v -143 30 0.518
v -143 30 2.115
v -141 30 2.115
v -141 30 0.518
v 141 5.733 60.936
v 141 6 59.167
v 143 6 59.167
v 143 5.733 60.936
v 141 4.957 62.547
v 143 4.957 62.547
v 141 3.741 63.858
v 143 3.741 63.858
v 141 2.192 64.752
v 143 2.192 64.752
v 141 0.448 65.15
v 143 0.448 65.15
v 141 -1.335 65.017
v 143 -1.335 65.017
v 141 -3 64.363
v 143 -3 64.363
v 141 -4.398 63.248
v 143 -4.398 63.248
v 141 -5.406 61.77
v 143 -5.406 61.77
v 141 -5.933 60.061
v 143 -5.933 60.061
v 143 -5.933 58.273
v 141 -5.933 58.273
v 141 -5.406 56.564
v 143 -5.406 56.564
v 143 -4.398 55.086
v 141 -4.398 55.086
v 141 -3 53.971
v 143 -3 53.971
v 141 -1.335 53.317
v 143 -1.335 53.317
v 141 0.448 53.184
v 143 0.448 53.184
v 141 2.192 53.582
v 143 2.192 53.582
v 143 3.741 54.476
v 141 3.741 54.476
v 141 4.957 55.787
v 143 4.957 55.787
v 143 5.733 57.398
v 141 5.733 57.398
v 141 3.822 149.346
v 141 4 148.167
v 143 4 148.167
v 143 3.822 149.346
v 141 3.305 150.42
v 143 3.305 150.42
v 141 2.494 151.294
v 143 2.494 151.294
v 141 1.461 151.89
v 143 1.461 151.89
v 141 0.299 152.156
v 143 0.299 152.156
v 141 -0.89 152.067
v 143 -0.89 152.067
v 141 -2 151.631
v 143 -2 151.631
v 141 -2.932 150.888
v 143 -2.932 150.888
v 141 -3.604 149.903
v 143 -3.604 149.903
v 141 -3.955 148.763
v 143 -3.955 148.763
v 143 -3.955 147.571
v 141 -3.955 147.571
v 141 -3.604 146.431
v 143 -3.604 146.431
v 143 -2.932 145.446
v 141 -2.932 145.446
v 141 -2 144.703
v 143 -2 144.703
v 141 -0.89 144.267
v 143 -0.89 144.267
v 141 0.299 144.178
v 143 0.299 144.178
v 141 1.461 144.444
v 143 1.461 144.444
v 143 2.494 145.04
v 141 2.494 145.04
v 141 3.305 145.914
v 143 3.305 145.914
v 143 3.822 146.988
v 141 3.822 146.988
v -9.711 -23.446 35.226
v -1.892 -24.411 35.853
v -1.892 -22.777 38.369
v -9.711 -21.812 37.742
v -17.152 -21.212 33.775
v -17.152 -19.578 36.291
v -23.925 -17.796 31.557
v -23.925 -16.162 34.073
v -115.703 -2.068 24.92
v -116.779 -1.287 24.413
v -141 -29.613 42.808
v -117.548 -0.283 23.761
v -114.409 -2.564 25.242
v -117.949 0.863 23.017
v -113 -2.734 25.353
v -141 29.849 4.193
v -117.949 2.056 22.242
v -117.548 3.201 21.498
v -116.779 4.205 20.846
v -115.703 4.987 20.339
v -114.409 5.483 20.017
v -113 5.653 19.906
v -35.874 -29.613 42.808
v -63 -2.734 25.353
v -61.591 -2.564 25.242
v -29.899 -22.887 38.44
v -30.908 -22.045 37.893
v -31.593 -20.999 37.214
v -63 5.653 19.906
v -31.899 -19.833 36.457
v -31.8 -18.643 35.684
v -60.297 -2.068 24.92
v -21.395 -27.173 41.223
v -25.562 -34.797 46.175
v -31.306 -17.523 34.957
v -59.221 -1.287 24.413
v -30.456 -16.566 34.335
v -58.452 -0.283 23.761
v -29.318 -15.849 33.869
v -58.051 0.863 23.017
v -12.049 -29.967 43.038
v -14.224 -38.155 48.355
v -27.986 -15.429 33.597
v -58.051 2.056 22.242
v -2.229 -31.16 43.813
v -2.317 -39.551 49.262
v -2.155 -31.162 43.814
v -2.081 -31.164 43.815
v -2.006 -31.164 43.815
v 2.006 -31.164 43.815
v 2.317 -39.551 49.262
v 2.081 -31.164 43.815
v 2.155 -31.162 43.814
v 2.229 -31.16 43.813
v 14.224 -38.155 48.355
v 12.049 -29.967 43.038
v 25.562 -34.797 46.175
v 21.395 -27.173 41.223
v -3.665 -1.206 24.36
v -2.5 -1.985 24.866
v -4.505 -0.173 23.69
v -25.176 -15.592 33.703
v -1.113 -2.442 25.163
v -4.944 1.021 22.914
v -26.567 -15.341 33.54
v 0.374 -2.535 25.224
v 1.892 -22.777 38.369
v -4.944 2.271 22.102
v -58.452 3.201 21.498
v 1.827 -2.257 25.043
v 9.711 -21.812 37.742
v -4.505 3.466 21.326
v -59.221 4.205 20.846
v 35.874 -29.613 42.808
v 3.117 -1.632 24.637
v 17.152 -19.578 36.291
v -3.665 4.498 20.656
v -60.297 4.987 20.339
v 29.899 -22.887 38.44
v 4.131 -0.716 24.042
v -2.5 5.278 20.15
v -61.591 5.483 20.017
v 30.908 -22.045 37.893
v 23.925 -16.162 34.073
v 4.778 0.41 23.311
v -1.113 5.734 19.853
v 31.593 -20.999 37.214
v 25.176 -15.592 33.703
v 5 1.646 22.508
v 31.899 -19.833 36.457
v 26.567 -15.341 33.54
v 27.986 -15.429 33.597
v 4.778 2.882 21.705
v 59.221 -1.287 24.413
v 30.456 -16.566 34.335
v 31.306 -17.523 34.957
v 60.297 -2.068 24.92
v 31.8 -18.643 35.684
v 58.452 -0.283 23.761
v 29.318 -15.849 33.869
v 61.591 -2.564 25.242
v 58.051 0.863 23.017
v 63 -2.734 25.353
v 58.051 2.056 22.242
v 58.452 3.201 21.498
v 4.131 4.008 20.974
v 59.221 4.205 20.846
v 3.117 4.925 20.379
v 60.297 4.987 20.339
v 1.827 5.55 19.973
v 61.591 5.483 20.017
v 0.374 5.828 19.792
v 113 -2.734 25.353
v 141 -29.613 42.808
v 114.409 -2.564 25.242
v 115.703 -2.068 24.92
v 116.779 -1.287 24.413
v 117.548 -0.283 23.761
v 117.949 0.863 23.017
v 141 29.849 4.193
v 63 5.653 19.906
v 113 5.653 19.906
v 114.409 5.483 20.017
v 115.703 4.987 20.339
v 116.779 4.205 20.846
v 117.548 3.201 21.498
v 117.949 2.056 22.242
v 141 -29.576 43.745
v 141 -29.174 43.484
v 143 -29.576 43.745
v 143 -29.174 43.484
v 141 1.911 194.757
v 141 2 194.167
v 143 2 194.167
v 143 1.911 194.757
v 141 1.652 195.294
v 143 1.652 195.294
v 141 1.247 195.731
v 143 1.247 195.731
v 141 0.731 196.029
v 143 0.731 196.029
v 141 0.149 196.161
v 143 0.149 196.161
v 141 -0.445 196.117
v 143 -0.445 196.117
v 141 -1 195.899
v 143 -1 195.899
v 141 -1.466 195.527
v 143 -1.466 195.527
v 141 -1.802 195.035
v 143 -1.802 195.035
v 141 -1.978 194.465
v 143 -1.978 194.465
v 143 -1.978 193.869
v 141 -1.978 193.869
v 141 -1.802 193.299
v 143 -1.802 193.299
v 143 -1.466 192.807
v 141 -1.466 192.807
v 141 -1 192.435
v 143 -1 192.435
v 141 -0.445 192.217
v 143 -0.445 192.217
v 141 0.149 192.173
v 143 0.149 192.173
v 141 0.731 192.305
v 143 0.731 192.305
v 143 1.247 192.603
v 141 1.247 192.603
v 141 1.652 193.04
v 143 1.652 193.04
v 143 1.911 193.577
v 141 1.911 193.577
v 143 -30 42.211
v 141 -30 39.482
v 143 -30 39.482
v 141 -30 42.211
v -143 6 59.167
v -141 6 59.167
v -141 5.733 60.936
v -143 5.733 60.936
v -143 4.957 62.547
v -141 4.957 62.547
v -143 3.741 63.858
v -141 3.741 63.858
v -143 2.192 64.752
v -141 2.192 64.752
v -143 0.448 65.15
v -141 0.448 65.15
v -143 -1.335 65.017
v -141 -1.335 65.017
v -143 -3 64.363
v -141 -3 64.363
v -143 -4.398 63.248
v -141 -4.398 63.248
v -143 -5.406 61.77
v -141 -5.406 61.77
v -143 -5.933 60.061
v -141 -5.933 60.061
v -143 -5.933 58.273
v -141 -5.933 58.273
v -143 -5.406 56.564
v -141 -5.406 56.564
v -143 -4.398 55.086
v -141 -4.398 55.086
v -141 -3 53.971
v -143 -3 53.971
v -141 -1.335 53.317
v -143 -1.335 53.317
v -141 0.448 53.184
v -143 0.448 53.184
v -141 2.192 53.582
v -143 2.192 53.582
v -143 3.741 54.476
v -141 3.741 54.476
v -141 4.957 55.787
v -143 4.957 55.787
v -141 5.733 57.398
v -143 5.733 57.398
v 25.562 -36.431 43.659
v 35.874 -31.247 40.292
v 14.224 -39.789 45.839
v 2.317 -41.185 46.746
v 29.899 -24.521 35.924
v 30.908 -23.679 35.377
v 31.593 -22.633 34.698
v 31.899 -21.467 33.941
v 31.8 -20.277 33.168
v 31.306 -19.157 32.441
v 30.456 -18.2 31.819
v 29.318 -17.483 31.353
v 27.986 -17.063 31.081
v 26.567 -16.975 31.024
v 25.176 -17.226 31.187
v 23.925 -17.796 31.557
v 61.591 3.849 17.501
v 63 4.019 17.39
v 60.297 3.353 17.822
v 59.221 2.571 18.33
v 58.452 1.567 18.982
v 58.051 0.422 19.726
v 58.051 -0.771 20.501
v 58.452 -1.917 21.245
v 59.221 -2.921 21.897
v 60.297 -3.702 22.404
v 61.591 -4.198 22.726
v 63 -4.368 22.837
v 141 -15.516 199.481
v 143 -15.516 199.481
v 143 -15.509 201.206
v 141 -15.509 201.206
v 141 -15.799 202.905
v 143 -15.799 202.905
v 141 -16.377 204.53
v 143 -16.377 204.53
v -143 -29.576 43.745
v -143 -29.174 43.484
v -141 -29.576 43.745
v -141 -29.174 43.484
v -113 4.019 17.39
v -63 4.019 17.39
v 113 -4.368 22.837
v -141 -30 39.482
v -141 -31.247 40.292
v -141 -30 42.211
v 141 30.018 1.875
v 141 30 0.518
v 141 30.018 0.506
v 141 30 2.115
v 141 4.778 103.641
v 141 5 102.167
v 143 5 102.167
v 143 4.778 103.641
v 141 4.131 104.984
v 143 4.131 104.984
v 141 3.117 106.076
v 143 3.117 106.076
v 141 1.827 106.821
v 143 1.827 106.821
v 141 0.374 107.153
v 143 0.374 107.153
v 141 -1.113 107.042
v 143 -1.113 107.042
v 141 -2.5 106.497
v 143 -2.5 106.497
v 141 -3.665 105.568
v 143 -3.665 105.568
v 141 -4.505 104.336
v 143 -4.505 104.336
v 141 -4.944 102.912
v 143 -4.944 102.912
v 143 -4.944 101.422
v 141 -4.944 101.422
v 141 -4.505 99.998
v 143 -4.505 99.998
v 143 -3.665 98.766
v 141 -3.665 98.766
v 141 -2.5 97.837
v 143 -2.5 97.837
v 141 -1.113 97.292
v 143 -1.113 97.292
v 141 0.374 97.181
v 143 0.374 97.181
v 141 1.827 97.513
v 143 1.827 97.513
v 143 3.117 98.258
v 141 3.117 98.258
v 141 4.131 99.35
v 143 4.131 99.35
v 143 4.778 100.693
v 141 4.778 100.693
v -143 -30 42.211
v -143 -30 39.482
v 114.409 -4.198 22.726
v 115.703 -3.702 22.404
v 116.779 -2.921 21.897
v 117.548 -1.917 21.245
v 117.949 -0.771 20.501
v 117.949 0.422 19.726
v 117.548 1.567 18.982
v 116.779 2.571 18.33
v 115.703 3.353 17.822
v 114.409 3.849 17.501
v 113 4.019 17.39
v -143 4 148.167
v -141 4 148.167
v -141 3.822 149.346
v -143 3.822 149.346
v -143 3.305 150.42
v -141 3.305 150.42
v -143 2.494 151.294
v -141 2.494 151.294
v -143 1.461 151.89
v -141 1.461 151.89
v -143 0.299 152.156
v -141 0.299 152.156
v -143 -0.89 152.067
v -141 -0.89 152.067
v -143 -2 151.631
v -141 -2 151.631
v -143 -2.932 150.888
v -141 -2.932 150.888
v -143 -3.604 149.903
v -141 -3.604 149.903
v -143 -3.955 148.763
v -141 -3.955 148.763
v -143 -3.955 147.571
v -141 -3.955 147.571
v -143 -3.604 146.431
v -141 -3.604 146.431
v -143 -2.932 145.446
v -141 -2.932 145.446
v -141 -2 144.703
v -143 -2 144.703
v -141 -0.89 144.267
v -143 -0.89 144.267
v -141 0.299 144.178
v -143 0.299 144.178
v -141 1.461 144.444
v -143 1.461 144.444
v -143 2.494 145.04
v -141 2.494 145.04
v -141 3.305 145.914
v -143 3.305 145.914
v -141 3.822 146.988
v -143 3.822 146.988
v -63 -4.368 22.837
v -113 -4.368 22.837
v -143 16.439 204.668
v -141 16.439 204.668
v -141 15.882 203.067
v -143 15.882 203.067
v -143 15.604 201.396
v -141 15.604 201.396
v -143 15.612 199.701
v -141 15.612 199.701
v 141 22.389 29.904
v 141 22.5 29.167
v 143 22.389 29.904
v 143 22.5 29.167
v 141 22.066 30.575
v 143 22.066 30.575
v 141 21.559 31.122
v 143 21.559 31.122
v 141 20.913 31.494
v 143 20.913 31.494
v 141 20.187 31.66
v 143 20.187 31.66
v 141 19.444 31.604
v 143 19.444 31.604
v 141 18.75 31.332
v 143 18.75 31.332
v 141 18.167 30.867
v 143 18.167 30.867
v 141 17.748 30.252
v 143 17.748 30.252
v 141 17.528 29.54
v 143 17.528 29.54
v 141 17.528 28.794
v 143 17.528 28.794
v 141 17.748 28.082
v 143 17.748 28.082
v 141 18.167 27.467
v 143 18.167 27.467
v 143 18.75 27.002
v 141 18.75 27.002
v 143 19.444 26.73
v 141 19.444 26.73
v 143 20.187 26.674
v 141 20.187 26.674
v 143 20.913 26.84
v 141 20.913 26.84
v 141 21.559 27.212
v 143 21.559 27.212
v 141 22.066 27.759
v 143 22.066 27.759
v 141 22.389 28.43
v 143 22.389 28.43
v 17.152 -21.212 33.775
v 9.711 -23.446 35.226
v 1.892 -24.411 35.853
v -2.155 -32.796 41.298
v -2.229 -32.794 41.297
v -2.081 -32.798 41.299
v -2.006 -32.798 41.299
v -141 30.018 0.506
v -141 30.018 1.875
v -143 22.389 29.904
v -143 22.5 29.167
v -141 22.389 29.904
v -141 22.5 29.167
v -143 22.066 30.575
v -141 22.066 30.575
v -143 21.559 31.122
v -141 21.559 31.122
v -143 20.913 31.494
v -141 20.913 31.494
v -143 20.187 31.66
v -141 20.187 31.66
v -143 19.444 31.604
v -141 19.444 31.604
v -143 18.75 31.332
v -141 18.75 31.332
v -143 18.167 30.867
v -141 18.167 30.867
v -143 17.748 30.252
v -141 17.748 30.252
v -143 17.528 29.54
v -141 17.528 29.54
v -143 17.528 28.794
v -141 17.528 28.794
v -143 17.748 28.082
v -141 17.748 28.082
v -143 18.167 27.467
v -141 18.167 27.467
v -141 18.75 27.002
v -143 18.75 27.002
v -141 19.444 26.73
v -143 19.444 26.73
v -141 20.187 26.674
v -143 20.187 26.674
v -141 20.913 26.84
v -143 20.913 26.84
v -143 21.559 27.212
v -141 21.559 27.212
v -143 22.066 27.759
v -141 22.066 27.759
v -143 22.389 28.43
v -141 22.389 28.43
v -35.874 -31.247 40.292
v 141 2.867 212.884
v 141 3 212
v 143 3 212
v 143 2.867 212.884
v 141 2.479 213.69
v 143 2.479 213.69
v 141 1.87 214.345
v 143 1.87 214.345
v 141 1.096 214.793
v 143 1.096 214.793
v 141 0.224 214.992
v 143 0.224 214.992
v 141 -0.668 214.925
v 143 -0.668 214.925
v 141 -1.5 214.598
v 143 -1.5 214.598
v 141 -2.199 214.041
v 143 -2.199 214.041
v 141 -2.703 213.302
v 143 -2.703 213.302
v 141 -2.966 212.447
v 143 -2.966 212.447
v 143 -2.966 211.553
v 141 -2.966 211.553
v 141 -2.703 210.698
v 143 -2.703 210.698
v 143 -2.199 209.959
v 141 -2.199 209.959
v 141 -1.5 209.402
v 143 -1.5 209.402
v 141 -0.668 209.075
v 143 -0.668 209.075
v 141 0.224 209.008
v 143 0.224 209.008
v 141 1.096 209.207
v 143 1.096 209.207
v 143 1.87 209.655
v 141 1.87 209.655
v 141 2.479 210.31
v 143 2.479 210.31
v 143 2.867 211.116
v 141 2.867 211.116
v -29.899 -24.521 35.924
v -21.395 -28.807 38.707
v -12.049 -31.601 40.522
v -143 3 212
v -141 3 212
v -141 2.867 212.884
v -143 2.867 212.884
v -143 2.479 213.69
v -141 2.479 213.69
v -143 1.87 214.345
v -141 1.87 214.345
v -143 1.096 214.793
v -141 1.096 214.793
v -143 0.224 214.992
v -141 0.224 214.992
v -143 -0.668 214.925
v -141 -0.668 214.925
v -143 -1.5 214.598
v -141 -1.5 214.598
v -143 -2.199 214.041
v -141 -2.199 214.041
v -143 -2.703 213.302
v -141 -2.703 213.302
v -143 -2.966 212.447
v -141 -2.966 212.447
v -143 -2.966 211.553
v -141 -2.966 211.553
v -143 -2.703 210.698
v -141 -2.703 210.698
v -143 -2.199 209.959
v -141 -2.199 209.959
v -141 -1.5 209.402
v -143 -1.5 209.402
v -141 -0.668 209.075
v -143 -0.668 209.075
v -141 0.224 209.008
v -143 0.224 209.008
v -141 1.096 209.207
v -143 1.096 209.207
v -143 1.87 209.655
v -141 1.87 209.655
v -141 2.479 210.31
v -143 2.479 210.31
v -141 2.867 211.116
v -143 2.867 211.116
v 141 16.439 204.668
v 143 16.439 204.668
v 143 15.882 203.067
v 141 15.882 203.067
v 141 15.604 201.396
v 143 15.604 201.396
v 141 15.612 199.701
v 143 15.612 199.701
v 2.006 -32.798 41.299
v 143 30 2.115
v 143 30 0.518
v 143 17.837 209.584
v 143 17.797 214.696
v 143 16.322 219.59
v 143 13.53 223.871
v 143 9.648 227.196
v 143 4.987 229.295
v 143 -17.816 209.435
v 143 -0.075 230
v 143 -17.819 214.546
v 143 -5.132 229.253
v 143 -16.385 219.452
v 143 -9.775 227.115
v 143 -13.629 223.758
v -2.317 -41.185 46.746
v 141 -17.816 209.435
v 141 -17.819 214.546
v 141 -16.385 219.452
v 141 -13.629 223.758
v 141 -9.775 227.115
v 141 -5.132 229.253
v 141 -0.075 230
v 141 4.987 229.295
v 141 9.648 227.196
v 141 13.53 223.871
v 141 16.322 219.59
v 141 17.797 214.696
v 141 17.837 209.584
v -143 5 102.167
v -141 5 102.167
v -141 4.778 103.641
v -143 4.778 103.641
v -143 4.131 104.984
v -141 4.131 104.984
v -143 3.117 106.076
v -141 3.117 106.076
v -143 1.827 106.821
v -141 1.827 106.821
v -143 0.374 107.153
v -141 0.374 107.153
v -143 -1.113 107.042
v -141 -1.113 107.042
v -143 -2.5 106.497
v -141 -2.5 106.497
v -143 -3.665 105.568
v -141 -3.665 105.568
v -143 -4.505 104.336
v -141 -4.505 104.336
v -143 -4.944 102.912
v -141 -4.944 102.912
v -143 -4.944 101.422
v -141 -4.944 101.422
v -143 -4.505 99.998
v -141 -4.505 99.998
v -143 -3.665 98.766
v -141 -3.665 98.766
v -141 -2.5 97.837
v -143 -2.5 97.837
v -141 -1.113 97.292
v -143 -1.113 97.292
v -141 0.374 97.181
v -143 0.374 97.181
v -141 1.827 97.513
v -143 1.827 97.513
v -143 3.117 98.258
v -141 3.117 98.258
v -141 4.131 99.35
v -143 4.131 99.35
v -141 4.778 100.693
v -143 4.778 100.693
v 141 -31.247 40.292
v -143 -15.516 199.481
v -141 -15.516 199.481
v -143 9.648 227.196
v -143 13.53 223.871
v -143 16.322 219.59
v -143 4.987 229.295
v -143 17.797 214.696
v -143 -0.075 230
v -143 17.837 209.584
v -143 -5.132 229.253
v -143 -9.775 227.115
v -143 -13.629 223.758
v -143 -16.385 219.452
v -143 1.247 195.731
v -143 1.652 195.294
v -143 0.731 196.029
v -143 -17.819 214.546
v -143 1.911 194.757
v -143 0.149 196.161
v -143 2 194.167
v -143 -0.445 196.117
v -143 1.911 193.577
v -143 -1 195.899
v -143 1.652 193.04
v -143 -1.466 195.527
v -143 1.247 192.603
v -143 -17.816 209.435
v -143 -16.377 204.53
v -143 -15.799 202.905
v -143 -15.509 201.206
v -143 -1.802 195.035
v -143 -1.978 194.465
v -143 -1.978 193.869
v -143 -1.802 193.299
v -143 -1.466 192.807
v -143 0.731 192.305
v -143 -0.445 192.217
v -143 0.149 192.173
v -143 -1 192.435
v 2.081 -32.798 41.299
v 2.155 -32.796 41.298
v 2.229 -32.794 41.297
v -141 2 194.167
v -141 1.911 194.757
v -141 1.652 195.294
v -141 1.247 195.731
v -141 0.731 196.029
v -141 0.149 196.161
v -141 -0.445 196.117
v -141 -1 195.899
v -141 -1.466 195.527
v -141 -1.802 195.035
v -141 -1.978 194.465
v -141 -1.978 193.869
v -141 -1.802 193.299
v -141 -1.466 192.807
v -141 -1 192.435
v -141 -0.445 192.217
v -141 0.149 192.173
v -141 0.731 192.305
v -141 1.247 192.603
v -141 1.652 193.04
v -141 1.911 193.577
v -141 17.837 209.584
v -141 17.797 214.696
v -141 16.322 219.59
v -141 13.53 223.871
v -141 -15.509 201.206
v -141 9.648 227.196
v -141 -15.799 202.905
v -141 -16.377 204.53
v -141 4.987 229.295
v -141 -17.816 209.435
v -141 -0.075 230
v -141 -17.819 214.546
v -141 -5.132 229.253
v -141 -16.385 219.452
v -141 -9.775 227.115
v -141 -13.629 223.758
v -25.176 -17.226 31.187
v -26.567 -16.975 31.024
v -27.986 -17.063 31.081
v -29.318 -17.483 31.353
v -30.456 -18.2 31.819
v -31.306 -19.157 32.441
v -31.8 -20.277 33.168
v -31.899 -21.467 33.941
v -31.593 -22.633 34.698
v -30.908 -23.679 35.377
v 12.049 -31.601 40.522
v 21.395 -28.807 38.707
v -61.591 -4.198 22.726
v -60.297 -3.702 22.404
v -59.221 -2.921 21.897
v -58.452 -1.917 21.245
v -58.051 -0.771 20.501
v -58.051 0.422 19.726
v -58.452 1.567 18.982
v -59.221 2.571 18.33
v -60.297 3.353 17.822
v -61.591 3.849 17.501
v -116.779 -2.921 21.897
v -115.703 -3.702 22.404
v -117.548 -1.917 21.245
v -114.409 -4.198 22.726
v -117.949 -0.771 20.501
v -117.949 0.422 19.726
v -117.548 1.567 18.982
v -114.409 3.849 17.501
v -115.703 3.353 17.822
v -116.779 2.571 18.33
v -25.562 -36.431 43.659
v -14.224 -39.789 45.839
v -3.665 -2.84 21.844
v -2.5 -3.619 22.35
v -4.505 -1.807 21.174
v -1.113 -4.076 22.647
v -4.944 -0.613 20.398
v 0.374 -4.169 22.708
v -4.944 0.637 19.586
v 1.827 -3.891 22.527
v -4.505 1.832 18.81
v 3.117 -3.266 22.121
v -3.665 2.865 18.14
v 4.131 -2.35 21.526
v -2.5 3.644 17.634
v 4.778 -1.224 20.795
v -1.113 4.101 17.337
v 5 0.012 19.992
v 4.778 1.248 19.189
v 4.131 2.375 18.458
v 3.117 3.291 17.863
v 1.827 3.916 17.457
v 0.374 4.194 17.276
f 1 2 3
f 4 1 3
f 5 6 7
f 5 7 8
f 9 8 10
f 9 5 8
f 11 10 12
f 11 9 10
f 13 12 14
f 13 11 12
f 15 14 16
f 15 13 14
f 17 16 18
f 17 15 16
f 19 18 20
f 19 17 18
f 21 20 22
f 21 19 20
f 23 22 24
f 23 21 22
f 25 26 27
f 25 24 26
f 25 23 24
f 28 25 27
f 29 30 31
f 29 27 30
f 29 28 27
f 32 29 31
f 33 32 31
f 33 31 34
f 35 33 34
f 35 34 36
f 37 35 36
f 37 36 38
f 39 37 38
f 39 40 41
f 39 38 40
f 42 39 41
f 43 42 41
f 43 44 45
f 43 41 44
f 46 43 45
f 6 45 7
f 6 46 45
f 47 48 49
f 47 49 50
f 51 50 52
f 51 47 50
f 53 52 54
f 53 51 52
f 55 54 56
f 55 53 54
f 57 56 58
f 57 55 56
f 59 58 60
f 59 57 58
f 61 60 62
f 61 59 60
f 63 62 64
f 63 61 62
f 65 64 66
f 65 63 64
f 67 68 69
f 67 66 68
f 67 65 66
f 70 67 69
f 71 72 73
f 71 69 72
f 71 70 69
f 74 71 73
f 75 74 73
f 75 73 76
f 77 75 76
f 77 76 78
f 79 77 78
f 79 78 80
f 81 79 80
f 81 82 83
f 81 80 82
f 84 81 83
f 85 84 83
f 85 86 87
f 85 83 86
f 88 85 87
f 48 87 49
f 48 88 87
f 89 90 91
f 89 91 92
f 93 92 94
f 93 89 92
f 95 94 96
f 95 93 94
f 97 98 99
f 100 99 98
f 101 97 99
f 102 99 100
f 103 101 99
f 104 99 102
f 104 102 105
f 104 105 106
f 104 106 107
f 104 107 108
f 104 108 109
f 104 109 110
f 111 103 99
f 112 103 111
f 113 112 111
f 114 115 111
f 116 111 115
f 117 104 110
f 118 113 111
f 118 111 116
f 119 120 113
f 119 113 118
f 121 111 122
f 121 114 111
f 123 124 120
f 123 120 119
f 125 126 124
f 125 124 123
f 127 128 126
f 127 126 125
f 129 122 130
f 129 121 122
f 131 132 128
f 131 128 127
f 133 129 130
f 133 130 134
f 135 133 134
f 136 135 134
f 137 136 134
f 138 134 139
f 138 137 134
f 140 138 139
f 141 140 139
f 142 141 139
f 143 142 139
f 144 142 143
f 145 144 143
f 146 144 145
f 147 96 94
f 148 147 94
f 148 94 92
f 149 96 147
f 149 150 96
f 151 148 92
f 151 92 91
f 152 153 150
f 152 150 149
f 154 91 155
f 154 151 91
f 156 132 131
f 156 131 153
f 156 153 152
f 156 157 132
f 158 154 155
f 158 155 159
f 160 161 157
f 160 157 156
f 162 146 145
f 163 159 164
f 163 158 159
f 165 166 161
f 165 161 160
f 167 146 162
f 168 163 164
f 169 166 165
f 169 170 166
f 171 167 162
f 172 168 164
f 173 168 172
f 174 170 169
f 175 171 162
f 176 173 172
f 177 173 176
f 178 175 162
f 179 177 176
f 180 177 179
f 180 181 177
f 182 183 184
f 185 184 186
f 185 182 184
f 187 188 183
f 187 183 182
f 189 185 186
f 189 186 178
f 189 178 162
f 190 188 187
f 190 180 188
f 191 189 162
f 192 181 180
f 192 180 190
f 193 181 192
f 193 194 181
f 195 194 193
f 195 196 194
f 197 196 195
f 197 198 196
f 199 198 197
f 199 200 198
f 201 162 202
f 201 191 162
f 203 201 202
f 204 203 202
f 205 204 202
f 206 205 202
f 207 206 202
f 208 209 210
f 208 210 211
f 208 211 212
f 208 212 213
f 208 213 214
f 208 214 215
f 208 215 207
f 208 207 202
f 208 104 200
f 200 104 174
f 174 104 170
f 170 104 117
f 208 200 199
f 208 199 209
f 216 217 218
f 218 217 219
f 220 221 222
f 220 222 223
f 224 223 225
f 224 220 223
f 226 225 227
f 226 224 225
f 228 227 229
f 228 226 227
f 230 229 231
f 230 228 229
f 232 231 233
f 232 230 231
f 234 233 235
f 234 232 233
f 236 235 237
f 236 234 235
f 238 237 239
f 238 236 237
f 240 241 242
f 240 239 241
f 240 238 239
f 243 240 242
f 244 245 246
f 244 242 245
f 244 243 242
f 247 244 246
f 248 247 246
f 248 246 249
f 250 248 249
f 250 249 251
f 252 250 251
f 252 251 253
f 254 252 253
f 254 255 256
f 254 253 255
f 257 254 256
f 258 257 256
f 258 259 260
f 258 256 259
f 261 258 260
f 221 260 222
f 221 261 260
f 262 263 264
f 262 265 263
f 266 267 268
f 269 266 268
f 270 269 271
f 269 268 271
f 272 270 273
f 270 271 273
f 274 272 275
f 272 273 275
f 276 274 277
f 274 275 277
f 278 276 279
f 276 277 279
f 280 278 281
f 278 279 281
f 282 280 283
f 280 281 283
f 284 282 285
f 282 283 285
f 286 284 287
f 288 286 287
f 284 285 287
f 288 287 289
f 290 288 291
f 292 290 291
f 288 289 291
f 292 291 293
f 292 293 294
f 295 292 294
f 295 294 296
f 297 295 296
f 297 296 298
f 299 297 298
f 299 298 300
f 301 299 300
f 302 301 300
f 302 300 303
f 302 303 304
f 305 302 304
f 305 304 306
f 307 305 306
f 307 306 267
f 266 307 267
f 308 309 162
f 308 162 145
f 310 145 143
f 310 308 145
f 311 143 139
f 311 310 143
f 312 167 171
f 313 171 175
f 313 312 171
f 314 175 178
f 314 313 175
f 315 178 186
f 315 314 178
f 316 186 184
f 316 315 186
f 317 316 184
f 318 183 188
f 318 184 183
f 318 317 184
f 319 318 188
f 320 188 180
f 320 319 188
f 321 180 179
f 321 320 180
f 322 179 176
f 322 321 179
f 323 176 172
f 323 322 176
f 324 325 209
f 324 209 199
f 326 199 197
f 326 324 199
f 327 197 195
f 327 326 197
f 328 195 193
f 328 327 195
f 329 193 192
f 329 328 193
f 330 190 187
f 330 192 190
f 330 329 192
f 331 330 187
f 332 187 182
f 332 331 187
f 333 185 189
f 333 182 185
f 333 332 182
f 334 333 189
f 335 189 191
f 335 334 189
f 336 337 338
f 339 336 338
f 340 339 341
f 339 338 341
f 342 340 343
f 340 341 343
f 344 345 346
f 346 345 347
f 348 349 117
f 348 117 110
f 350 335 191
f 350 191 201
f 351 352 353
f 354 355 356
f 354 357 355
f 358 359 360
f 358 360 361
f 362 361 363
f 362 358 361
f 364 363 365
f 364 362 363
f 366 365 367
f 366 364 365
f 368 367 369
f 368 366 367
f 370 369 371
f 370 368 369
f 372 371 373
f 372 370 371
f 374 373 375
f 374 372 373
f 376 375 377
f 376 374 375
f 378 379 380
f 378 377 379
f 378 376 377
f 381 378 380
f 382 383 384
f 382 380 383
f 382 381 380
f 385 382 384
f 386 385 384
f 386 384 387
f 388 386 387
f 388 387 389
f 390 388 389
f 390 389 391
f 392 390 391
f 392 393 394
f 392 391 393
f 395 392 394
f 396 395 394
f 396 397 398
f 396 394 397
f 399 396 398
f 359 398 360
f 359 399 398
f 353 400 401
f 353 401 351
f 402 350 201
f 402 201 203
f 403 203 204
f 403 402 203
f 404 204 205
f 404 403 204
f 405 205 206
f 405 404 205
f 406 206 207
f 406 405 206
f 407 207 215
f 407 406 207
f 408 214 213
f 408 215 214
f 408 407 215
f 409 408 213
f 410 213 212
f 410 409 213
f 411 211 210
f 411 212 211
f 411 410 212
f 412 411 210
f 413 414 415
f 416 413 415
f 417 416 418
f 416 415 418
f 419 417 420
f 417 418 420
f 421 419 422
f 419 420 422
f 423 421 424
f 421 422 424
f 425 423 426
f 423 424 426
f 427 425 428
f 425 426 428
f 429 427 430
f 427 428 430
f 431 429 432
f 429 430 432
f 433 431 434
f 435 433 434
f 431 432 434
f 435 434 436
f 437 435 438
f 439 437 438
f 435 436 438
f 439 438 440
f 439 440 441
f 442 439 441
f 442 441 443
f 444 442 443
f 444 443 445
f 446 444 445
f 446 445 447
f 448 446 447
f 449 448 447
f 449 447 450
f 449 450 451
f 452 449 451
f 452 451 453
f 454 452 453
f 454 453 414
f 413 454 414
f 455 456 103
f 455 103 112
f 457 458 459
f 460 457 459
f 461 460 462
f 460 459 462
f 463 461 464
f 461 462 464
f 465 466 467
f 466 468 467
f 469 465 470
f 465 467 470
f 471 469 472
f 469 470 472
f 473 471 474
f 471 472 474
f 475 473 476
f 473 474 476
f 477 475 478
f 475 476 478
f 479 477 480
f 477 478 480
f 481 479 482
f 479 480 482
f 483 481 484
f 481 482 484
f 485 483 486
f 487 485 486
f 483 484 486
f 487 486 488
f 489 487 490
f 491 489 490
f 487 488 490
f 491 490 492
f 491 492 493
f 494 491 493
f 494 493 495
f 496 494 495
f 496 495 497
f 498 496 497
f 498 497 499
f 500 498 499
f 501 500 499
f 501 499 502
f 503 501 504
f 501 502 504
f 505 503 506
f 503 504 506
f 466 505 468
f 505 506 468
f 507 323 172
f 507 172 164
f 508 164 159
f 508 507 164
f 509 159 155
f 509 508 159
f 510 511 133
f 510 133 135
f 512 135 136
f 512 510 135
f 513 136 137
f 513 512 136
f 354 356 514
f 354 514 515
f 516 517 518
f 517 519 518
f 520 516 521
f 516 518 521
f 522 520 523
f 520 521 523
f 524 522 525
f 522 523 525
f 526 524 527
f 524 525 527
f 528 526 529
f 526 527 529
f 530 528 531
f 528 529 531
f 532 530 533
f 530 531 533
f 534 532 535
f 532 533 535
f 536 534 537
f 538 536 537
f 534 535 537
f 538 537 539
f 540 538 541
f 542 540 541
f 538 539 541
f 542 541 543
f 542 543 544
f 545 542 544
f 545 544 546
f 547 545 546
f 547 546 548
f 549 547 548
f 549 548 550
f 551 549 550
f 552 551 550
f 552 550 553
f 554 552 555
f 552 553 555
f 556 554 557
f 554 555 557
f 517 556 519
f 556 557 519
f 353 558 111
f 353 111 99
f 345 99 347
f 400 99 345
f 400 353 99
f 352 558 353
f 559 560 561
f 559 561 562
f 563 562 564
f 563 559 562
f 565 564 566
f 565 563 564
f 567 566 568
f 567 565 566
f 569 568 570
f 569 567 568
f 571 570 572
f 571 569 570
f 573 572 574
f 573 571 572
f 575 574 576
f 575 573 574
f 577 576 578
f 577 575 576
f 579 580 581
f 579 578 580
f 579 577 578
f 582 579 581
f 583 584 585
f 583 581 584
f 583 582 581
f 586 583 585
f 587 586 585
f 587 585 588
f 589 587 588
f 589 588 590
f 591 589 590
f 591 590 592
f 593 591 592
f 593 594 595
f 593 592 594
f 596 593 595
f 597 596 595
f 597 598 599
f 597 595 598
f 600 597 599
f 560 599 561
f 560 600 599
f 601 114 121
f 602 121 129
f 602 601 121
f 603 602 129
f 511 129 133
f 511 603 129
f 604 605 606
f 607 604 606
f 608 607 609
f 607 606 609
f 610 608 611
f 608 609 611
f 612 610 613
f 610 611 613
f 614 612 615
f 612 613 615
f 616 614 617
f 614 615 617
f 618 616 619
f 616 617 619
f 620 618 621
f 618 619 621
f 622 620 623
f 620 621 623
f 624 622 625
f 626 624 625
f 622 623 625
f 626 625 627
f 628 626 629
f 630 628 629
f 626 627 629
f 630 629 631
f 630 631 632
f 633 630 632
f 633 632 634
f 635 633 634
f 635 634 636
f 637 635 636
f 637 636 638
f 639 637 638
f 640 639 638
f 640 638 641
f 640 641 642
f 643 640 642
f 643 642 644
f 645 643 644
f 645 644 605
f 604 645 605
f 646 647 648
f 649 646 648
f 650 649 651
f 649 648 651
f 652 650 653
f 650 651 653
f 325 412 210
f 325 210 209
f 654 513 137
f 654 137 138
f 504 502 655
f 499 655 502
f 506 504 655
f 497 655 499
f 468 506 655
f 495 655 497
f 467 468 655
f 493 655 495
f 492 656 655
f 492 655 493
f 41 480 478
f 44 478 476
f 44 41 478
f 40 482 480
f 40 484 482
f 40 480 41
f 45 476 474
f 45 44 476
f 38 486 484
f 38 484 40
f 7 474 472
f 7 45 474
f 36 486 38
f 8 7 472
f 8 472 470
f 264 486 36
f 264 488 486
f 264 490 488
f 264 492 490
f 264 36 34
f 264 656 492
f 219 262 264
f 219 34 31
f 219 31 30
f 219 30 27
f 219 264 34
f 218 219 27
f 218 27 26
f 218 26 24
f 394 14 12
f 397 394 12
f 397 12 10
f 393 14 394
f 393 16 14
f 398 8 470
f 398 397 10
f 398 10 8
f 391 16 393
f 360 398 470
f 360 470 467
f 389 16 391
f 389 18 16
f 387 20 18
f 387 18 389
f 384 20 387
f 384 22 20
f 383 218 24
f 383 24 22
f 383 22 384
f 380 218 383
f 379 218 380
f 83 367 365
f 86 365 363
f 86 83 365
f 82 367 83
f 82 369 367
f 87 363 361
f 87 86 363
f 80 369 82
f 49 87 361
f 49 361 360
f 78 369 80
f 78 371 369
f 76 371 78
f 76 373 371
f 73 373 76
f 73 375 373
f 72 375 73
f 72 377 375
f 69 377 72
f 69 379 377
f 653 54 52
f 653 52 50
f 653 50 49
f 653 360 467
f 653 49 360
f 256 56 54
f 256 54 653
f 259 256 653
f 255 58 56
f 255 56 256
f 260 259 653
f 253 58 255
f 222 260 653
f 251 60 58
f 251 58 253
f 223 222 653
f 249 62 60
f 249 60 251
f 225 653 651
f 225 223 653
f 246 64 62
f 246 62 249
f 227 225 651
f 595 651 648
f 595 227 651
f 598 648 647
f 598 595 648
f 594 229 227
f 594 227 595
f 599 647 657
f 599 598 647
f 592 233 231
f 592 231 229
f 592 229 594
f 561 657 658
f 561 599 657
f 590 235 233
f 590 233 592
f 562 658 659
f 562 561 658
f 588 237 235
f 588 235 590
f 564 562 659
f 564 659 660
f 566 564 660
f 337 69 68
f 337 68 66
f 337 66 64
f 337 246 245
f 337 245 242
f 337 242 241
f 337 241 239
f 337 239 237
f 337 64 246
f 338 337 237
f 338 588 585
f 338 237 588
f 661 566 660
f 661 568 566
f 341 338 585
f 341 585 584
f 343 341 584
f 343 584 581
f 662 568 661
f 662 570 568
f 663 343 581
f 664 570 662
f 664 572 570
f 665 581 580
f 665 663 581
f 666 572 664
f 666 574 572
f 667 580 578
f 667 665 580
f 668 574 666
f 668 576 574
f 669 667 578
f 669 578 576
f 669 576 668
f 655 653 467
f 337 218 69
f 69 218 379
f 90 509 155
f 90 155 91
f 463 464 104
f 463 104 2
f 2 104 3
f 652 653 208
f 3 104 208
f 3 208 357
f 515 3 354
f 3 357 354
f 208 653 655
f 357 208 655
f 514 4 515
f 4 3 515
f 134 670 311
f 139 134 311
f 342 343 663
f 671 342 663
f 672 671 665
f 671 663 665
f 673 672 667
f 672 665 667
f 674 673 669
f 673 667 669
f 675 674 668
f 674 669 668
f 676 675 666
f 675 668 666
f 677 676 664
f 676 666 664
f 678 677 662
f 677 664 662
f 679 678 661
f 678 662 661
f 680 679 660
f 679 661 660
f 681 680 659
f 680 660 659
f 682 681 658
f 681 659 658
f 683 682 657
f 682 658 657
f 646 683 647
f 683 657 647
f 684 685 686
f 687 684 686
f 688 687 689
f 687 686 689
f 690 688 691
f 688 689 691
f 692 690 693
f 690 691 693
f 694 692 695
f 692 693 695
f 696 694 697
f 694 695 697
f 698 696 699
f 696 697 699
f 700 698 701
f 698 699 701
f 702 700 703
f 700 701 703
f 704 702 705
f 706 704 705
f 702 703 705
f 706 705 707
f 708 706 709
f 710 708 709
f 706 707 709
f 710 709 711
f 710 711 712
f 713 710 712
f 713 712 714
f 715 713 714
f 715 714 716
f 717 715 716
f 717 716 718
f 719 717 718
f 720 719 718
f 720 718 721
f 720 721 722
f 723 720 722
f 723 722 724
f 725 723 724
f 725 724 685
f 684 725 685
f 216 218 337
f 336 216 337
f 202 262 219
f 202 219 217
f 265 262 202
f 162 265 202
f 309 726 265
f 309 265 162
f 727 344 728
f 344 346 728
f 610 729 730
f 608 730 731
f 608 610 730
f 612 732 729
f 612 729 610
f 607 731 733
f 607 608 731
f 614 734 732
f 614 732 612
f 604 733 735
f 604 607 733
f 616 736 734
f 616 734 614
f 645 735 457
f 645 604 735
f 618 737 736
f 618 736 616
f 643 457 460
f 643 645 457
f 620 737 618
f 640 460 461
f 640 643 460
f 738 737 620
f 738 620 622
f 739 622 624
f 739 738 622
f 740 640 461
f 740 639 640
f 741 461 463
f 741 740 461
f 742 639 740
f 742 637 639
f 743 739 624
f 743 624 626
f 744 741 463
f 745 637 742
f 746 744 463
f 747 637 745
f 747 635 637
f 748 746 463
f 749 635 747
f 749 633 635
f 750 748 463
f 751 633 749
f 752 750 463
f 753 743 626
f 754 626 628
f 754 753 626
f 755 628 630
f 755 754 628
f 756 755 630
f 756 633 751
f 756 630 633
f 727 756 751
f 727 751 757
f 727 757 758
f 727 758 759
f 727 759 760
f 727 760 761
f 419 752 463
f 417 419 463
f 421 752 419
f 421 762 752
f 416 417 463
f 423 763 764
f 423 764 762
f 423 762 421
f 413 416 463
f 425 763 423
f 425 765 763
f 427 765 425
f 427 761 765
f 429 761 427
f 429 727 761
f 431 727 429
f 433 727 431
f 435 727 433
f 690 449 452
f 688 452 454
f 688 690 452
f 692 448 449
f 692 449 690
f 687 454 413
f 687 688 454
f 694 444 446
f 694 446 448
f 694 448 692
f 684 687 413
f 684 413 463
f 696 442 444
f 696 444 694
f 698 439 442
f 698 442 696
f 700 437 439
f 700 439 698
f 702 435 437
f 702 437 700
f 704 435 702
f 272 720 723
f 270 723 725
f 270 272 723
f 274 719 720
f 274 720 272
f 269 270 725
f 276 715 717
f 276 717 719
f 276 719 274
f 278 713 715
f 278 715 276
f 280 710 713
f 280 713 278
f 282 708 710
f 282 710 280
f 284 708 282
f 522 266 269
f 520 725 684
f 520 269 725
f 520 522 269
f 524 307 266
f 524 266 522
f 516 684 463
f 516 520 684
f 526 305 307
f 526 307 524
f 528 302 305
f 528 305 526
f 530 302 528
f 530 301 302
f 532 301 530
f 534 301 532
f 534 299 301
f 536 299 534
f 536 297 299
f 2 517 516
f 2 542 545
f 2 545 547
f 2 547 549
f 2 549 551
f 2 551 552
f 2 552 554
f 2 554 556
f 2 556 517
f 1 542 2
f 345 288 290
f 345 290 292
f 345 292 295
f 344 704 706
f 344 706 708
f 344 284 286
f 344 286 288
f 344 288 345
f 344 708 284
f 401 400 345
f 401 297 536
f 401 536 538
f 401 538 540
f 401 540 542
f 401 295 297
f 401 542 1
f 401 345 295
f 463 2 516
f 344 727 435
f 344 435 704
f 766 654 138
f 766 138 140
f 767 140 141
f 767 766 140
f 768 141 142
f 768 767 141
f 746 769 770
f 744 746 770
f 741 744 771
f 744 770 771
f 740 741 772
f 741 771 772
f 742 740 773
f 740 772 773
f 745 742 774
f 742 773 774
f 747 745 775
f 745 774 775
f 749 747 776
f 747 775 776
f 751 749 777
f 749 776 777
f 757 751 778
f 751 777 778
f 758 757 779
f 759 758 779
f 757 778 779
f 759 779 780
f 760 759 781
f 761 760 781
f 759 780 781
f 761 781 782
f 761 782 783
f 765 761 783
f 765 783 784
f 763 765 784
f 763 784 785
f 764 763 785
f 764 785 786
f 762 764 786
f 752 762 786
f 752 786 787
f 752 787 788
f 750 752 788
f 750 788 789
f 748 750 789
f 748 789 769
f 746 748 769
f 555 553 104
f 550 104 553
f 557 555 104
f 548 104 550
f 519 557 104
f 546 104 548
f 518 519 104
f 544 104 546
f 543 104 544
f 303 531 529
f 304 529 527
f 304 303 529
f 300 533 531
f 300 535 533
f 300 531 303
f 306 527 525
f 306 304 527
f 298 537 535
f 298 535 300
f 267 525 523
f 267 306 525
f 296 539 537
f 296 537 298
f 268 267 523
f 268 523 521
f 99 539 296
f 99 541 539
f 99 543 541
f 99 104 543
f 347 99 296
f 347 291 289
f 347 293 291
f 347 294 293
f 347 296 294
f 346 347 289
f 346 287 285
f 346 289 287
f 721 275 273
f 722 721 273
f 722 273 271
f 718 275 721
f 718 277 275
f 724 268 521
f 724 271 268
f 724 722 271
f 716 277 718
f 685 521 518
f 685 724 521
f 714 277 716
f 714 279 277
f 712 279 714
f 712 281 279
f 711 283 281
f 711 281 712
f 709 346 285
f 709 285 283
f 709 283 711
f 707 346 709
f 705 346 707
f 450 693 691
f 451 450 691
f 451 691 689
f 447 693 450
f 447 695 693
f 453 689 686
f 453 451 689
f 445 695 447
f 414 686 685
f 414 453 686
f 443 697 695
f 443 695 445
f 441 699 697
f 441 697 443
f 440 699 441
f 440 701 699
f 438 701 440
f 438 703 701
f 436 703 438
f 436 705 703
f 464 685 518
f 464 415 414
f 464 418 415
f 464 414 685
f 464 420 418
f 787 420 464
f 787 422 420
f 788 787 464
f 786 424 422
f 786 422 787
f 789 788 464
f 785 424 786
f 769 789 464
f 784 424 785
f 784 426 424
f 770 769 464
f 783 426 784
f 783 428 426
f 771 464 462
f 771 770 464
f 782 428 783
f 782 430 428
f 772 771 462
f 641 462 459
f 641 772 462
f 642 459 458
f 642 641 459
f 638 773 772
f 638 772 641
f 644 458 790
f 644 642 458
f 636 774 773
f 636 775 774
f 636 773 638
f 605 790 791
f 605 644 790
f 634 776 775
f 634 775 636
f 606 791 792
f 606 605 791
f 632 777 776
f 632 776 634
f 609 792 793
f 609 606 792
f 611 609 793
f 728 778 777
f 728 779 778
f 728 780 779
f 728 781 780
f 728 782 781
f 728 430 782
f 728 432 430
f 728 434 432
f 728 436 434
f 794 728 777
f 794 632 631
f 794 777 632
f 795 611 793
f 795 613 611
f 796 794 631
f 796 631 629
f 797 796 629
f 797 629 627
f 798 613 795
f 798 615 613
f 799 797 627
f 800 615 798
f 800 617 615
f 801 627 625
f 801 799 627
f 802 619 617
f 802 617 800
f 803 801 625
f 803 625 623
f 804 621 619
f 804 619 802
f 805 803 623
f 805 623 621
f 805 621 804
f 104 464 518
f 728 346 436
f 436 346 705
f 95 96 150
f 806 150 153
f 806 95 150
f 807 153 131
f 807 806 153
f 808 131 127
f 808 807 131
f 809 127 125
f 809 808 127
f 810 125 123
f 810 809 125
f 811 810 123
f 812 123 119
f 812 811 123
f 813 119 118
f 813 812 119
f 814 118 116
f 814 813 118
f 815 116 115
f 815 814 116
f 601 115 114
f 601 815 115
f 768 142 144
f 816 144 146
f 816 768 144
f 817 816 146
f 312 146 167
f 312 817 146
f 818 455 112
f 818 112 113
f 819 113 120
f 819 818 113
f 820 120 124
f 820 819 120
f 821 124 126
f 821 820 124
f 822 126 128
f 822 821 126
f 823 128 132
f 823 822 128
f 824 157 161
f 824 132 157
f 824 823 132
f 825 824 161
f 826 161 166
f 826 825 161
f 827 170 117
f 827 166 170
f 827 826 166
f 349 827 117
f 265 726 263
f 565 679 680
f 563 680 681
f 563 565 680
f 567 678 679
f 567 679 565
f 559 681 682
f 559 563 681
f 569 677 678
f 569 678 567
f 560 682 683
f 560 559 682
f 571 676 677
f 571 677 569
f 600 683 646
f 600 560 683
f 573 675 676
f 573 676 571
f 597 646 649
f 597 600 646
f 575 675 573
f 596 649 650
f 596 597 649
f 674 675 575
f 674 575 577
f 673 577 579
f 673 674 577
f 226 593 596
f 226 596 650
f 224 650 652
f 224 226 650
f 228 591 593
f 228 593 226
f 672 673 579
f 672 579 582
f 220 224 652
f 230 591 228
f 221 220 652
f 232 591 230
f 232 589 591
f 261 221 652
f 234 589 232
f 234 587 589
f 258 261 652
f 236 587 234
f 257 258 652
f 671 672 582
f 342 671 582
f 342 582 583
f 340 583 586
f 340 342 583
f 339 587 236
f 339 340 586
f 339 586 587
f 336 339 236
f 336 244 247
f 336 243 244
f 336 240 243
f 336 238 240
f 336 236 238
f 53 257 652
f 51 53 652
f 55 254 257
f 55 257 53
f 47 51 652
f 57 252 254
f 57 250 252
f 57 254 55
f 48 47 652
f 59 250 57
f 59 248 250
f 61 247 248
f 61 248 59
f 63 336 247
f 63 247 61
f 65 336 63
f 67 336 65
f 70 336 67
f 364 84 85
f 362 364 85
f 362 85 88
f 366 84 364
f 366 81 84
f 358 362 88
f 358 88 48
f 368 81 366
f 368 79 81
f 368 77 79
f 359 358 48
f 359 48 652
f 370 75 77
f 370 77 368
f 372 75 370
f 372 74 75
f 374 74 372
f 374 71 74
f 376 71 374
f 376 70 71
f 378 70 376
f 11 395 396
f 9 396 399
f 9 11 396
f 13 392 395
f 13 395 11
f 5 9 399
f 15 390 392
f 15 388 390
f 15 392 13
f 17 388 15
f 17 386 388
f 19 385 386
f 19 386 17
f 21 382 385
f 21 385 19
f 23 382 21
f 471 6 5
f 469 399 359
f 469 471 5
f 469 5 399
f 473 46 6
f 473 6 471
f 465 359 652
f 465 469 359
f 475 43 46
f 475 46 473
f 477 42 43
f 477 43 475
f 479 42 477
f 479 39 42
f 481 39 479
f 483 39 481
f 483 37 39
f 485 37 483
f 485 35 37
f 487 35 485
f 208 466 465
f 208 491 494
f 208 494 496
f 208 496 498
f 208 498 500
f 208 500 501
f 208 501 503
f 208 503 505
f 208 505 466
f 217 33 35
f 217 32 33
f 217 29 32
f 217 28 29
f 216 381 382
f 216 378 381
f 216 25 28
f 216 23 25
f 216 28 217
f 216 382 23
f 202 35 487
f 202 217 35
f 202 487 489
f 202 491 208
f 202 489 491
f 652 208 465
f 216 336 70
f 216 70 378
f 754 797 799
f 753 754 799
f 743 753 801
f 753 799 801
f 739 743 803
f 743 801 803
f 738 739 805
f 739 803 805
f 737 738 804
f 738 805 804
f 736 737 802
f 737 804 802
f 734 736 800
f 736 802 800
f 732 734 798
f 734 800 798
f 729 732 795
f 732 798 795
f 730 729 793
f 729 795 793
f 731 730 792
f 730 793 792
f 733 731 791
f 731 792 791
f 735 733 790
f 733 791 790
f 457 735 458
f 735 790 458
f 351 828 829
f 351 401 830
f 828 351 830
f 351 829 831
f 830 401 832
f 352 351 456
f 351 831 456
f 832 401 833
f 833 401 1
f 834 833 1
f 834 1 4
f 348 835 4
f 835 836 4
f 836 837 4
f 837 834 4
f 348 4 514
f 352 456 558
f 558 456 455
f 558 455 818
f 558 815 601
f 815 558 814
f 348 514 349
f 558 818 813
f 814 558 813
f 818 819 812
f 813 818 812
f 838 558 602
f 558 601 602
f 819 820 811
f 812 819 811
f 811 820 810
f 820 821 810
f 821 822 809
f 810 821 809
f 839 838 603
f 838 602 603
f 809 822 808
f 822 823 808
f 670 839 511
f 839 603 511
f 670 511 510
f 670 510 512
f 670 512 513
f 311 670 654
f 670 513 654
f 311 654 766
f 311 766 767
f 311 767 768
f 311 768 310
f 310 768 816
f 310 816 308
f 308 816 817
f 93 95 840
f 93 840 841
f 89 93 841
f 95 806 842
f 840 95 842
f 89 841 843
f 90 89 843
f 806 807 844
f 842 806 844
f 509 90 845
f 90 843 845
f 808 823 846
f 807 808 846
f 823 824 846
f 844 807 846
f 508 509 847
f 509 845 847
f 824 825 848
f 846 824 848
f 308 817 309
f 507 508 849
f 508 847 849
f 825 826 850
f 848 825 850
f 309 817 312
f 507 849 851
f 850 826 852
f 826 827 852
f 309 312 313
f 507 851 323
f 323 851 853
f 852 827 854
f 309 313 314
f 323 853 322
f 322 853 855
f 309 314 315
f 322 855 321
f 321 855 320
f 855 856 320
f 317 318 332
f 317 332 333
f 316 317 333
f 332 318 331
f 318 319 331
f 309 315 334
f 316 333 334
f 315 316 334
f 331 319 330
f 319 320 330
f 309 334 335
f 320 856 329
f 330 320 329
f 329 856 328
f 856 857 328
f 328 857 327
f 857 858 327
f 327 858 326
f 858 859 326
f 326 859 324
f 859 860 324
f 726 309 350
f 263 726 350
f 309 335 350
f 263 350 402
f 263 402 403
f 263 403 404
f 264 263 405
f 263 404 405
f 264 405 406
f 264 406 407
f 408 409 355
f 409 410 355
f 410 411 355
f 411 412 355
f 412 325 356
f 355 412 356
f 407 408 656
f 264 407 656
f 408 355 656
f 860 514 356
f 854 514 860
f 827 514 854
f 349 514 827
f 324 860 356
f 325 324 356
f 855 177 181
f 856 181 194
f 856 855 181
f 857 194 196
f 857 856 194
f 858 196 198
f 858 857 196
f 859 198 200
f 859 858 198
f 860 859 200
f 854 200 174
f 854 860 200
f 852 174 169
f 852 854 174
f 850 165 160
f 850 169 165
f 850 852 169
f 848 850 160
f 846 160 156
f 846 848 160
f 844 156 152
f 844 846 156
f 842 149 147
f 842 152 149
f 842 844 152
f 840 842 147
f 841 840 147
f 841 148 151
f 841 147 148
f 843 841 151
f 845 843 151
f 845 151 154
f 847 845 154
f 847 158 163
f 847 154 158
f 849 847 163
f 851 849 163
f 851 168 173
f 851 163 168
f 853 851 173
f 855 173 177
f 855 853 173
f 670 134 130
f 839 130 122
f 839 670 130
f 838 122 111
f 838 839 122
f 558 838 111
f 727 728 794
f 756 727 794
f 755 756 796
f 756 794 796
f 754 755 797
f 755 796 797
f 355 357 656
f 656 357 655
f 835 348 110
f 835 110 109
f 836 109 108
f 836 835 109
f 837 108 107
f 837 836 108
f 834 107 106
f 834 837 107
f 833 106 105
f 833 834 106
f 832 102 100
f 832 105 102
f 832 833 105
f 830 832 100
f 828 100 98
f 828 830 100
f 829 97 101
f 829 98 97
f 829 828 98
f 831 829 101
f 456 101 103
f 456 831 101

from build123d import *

# Parameters (mm, degrees)
F1_DEPTH  = 30
F5_W      = 282
F5_H      = 120
F6_DEPTH  = 3
F7_W      = 43.7729824334
F7_H      = 28.8367732428
F8_DEPTH  = 200
F9_W      = 426.6595542431
F9_H      = 302.5457262993
F10_DEPTH = 178.83968
F12_DEPTH = 3.8062
F13_R     = 5
F14_DEPTH = 5.03518
F16_DEPTH = 250
F17_R     = 3
F17_R_2   = 2
F17_R_3   = 4
F17_R_4   = 5
F17_R_5   = 6
F17_R_6   = 2.5
F18_DEPTH = 160


with BuildPart() as f1:
    # F0 (on Front) → F1 (new body, symmetric)
    with BuildSketch(Plane.XZ):
        Polygon((-143, 230), (-143, 0), (143, 0), (143, 230), (141, 230), (141, 2), (-141, 2), (-141, 230), align=None)
    extrude(amount=F1_DEPTH, both=True)

    # F5 (on line) → F6 (join)
    with BuildSketch(Plane(origin=(0, 9.1354545764, 14.0673664308), x_dir=(1, 0, 0), z_dir=(0, 0.544639035, 0.8386705679))):
        Rectangle(F5_W, F5_H)
    extrude(amount=F6_DEPTH)

    # F7 (on Right) → F8 (cut, symmetric)
    with BuildSketch(Plane.YZ):
        with Locations((51.9040221355, -7.7139467467)):
            Rectangle(F7_W, F7_H)
    extrude(amount=F8_DEPTH, both=True, mode=Mode.SUBTRACT)

    # F9 (on line) → F10 (cut)
    with BuildSketch(Plane(origin=(0, 9.1354545764, 14.0673664308), x_dir=(1, 0, 0), z_dir=(0, 0.544639035, 0.8386705679))):
        Rectangle(F9_W, F9_H)
    extrude(amount=-F10_DEPTH, mode=Mode.SUBTRACT)

    # F11 (on line) → F12 (cut)
    with BuildSketch(Plane(origin=(0, 9.1354545764, 14.0673664308), x_dir=(1, 0, 0), z_dir=(0, 0.544639035, 0.8386705679))):
        with BuildLine():
            Line((-35.8740181322, -48.1499919599), (-147.1929774903, -48.1499919599))
            Line((-147.1929774903, -48.1499919599), (-147.1929774903, -83.3061976281))
            Line((-147.1929774903, -83.3061976281), (146.3554831755, -83.3061976281))
            Line((146.3554831755, -83.3061976281), (146.3554831755, -48.1499919599))
            Line((146.3554831755, -48.1499919599), (35.8740181322, -48.1499919599))
            ThreePointArc((35.8740181322, -48.1499919599), (0, -60.0447075327), (-35.8740181322, -48.1499919599))
        make_face()
    extrude(amount=F12_DEPTH, mode=Mode.SUBTRACT)

    # F13 (on line) → F14 (cut)
    with BuildSketch(Plane(origin=(0, 9.1354545764, 14.0673664308), x_dir=(1, 0, 0), z_dir=(0, 0.544639035, 0.8386705679))):
        with Locations((0, -10.8780780347)):
            Circle(F13_R)
        with BuildLine():
            ThreePointArc((0, -40.4202267205), (2.1637354956, -42.2413960688), (2.9932901548, -44.9451431276))
            ThreePointArc((2.9932901548, -44.9451431276), (4.9922933203, -44.7672054535), (6.9813866372, -44.5004035637))
            ThreePointArc((6.9813866372, -44.5004035637), (5.3606612707, -41.2920368002), (2.0064089085, -40))
            Line((2.0064089085, -40), (1.8917191601, -40))
            ThreePointArc((1.8917191601, -40), (1.8377091807, -40.0025177501), (1.7836958509, -40.0049625733))
            ThreePointArc((1.7836958509, -40.0049625733), (0.8726729327, -40.1302317573), (0, -40.4202267205))
        make_face()
        with BuildLine():
            ThreePointArc((6.9813866372, -44.5004035637), (4.9922933203, -44.7672054535), (2.9932901548, -44.9451431276))
            ThreePointArc((2.9932901548, -44.9451431276), (2.1937501825, -47.7126856822), (0, -49.5797732795))
            ThreePointArc((0, -49.5797732795), (0.9814372986, -49.8938158117), (2.0064089085, -50))
            ThreePointArc((2.0064089085, -50), (2.1177930783, -49.9987592027), (2.2291219661, -49.9950374267))
            ThreePointArc((2.2291219661, -49.9950374267), (5.7881740651, -48.2708182922), (6.9813866372, -44.5004035637))
        make_face()
        with BuildLine():
            ThreePointArc((2.0064089085, -40), (5.3606612707, -41.2920368002), (6.9813866372, -44.5004035637))
            ThreePointArc((6.9813866372, -44.5004035637), (5.7881740651, -48.2708182922), (2.2291219661, -49.9950374267))
            ThreePointArc((2.2291219661, -49.9950374267), (16.8043601395, -47.1390096665), (29.8994669009, -40.1309684792))
            ThreePointArc((29.8994669009, -40.1309684792), (30.9217030257, -33.1341811231), (23.9249156696, -32.1119449984))
            ThreePointArc((23.9249156696, -32.1119449984), (13.4974075811, -37.7014401578), (1.8917191601, -40))
            Line((1.8917191601, -40), (2.0064089085, -40))
        make_face()
        with BuildLine():
            ThreePointArc((-1.7836958509, -40.0049625733), (-0.8726729327, -40.1302317574), (0, -40.4202267205))
            ThreePointArc((0, -40.4202267205), (0.8726729327, -40.1302317573), (1.7836958509, -40.0049625733))
            ThreePointArc((1.7836958509, -40.0049625733), (1.8377091807, -40.0025177501), (1.8917191601, -40))
            Line((1.8917191601, -40), (-1.8917191601, -40))
            ThreePointArc((-1.8917191601, -40), (-1.8377091807, -40.0025177501), (-1.7836958509, -40.0049625733))
        make_face()
        with BuildLine():
            ThreePointArc((-2.9932901548, -44.9451431276), (-2.1637354956, -42.2413960688), (0, -40.4202267205))
            ThreePointArc((0, -40.4202267205), (-0.8726729327, -40.1302317574), (-1.7836958509, -40.0049625733))
            ThreePointArc((-1.7836958509, -40.0049625733), (-1.8377091807, -40.0025177501), (-1.8917191601, -40))
            Line((-1.8917191601, -40), (-2.0064089085, -40))
            ThreePointArc((-2.0064089085, -40), (-5.3606612707, -41.2920368002), (-6.9813866372, -44.5004035637))
            ThreePointArc((-6.9813866372, -44.5004035637), (-4.9922933203, -44.7672054535), (-2.9932901548, -44.9451431276))
        make_face()
        with BuildLine():
            ThreePointArc((-2.0064089085, -50), (-0.9814372986, -49.8938158117), (0, -49.5797732795))
            ThreePointArc((0, -49.5797732795), (-2.1937501825, -47.7126856822), (-2.9932901548, -44.9451431276))
            ThreePointArc((-2.9932901548, -44.9451431276), (-4.9922933203, -44.7672054535), (-6.9813866372, -44.5004035637))
            ThreePointArc((-6.9813866372, -44.5004035637), (-5.7881740651, -48.2708182922), (-2.2291219661, -49.9950374267))
            ThreePointArc((-2.2291219661, -49.9950374267), (-2.1177930783, -49.9987592027), (-2.0064089085, -50))
        make_face()
        with BuildLine():
            ThreePointArc((2.0064089085, -50), (0.9814372986, -49.8938158117), (0, -49.5797732795))
            ThreePointArc((0, -49.5797732795), (-0.9814372986, -49.8938158117), (-2.0064089085, -50))
            Line((-2.0064089085, -50), (2.0064089085, -50))
        make_face()
        with BuildLine():
            ThreePointArc((-2.2291219661, -49.9950374267), (-5.7881740651, -48.2708182922), (-6.9813866372, -44.5004035637))
            ThreePointArc((-6.9813866372, -44.5004035637), (-5.3606612707, -41.2920368002), (-2.0064089085, -40))
            Line((-2.0064089085, -40), (-1.8917191601, -40))
            ThreePointArc((-1.8917191601, -40), (-13.4974075811, -37.7014401578), (-23.9249156696, -32.1119449984))
            ThreePointArc((-23.9249156696, -32.1119449984), (-30.9217030257, -33.1341811231), (-29.8994669009, -40.1309684792))
            ThreePointArc((-29.8994669009, -40.1309684792), (-16.8043601395, -47.1390096665), (-2.2291219661, -49.9950374267))
        make_face()
        with BuildLine():
            ThreePointArc((63, -6.1009786912), (58, -11.1009786912), (63, -16.1009786912))
            Line((63, -16.1009786912), (113, -16.1009786912))
            ThreePointArc((113, -16.1009786912), (118, -11.1009786912), (113, -6.1009786912))
            Line((113, -6.1009786912), (63, -6.1009786912))
        make_face()
        with BuildLine():
            ThreePointArc((-63, -16.1009786912), (-58, -11.1009786912), (-63, -6.1009786912))
            Line((-63, -6.1009786912), (-113, -6.1009786912))
            ThreePointArc((-113, -6.1009786912), (-118, -11.1009786912), (-113, -16.1009786912))
            Line((-113, -16.1009786912), (-63, -16.1009786912))
        make_face()
        with BuildLine():
            Line((-2.0064089085, -45), (2.0064089085, -45))
            ThreePointArc((2.0064089085, -45), (2.5, -44.9752785062), (2.9932901548, -44.9451431276))
            ThreePointArc((2.9932901548, -44.9451431276), (2.1637354956, -42.2413960688), (0, -40.4202267205))
            ThreePointArc((0, -40.4202267205), (-2.1637354956, -42.2413960688), (-2.9932901548, -44.9451431276))
            ThreePointArc((-2.9932901548, -44.9451431276), (-2.5, -44.9752785062), (-2.0064089085, -45))
        make_face()
        with BuildLine():
            ThreePointArc((2.9932901548, -44.9451431276), (2.5, -44.9752785062), (2.0064089085, -45))
            Line((2.0064089085, -45), (-2.0064089085, -45))
            ThreePointArc((-2.0064089085, -45), (-2.5, -44.9752785062), (-2.9932901548, -44.9451431276))
            ThreePointArc((-2.9932901548, -44.9451431276), (-2.1937501825, -47.7126856822), (0, -49.5797732795))
            ThreePointArc((0, -49.5797732795), (2.1937501825, -47.7126856822), (2.9932901548, -44.9451431276))
        make_face()
    extrude(amount=F14_DEPTH, mode=Mode.SUBTRACT)

    # F15 (on Right) → F16 (cut, symmetric)
    with BuildSketch(Plane.YZ):
        with BuildLine():
            ThreePointArc((-16.3768878257, 204.5302245586), (-0.0754798588, 229.9998417435), (16.4389577327, 204.6678332901))
            ThreePointArc((16.4389577327, 204.6678332901), (15.7076024778, 202.2373750115), (15.6116939447, 199.7010766248))
            Line((15.6116939447, 199.7010766248), (30.1540475339, 0))
            Line((30.1540475339, 0), (77.6267153025, 0))
            Line((77.6267153025, 0), (77.6267153025, 43.465353315))
            Line((77.6267153025, 43.465353315), (77.6267153025, 273.465353315))
            Line((77.6267153025, 273.465353315), (-42.3732846975, 273.465353315))
            Line((-42.3732846975, 273.465353315), (-42.3732846975, 52.13252455))
            Line((-42.3732846975, 52.13252455), (-29.599333182, 43.482657522))
            Line((-29.599333182, 43.482657522), (-15.5156644868, 199.4811984753))
            ThreePointArc((-15.5156644868, 199.4811984753), (-15.6175338066, 202.0617858131), (-16.3768878257, 204.5302245586))
        make_face()
    extrude(amount=F16_DEPTH, both=True, mode=Mode.SUBTRACT)

    # F17 (on Right) → F18 (cut, symmetric)
    with BuildSketch(Plane.YZ):
        with Locations((0, 212)):
            Circle(F17_R)
        with Locations((0, 194.167)):
            Circle(F17_R_2)
        with Locations((0, 148.167)):
            Circle(F17_R_3)
        with Locations((0, 102.167)):
            Circle(F17_R_4)
        with Locations((0, 59.167)):
            Circle(F17_R_5)
        with Locations((20, 29.167)):
            Circle(F17_R_6)
    extrude(amount=F18_DEPTH, both=True, mode=Mode.SUBTRACT)


solid = f1.part
